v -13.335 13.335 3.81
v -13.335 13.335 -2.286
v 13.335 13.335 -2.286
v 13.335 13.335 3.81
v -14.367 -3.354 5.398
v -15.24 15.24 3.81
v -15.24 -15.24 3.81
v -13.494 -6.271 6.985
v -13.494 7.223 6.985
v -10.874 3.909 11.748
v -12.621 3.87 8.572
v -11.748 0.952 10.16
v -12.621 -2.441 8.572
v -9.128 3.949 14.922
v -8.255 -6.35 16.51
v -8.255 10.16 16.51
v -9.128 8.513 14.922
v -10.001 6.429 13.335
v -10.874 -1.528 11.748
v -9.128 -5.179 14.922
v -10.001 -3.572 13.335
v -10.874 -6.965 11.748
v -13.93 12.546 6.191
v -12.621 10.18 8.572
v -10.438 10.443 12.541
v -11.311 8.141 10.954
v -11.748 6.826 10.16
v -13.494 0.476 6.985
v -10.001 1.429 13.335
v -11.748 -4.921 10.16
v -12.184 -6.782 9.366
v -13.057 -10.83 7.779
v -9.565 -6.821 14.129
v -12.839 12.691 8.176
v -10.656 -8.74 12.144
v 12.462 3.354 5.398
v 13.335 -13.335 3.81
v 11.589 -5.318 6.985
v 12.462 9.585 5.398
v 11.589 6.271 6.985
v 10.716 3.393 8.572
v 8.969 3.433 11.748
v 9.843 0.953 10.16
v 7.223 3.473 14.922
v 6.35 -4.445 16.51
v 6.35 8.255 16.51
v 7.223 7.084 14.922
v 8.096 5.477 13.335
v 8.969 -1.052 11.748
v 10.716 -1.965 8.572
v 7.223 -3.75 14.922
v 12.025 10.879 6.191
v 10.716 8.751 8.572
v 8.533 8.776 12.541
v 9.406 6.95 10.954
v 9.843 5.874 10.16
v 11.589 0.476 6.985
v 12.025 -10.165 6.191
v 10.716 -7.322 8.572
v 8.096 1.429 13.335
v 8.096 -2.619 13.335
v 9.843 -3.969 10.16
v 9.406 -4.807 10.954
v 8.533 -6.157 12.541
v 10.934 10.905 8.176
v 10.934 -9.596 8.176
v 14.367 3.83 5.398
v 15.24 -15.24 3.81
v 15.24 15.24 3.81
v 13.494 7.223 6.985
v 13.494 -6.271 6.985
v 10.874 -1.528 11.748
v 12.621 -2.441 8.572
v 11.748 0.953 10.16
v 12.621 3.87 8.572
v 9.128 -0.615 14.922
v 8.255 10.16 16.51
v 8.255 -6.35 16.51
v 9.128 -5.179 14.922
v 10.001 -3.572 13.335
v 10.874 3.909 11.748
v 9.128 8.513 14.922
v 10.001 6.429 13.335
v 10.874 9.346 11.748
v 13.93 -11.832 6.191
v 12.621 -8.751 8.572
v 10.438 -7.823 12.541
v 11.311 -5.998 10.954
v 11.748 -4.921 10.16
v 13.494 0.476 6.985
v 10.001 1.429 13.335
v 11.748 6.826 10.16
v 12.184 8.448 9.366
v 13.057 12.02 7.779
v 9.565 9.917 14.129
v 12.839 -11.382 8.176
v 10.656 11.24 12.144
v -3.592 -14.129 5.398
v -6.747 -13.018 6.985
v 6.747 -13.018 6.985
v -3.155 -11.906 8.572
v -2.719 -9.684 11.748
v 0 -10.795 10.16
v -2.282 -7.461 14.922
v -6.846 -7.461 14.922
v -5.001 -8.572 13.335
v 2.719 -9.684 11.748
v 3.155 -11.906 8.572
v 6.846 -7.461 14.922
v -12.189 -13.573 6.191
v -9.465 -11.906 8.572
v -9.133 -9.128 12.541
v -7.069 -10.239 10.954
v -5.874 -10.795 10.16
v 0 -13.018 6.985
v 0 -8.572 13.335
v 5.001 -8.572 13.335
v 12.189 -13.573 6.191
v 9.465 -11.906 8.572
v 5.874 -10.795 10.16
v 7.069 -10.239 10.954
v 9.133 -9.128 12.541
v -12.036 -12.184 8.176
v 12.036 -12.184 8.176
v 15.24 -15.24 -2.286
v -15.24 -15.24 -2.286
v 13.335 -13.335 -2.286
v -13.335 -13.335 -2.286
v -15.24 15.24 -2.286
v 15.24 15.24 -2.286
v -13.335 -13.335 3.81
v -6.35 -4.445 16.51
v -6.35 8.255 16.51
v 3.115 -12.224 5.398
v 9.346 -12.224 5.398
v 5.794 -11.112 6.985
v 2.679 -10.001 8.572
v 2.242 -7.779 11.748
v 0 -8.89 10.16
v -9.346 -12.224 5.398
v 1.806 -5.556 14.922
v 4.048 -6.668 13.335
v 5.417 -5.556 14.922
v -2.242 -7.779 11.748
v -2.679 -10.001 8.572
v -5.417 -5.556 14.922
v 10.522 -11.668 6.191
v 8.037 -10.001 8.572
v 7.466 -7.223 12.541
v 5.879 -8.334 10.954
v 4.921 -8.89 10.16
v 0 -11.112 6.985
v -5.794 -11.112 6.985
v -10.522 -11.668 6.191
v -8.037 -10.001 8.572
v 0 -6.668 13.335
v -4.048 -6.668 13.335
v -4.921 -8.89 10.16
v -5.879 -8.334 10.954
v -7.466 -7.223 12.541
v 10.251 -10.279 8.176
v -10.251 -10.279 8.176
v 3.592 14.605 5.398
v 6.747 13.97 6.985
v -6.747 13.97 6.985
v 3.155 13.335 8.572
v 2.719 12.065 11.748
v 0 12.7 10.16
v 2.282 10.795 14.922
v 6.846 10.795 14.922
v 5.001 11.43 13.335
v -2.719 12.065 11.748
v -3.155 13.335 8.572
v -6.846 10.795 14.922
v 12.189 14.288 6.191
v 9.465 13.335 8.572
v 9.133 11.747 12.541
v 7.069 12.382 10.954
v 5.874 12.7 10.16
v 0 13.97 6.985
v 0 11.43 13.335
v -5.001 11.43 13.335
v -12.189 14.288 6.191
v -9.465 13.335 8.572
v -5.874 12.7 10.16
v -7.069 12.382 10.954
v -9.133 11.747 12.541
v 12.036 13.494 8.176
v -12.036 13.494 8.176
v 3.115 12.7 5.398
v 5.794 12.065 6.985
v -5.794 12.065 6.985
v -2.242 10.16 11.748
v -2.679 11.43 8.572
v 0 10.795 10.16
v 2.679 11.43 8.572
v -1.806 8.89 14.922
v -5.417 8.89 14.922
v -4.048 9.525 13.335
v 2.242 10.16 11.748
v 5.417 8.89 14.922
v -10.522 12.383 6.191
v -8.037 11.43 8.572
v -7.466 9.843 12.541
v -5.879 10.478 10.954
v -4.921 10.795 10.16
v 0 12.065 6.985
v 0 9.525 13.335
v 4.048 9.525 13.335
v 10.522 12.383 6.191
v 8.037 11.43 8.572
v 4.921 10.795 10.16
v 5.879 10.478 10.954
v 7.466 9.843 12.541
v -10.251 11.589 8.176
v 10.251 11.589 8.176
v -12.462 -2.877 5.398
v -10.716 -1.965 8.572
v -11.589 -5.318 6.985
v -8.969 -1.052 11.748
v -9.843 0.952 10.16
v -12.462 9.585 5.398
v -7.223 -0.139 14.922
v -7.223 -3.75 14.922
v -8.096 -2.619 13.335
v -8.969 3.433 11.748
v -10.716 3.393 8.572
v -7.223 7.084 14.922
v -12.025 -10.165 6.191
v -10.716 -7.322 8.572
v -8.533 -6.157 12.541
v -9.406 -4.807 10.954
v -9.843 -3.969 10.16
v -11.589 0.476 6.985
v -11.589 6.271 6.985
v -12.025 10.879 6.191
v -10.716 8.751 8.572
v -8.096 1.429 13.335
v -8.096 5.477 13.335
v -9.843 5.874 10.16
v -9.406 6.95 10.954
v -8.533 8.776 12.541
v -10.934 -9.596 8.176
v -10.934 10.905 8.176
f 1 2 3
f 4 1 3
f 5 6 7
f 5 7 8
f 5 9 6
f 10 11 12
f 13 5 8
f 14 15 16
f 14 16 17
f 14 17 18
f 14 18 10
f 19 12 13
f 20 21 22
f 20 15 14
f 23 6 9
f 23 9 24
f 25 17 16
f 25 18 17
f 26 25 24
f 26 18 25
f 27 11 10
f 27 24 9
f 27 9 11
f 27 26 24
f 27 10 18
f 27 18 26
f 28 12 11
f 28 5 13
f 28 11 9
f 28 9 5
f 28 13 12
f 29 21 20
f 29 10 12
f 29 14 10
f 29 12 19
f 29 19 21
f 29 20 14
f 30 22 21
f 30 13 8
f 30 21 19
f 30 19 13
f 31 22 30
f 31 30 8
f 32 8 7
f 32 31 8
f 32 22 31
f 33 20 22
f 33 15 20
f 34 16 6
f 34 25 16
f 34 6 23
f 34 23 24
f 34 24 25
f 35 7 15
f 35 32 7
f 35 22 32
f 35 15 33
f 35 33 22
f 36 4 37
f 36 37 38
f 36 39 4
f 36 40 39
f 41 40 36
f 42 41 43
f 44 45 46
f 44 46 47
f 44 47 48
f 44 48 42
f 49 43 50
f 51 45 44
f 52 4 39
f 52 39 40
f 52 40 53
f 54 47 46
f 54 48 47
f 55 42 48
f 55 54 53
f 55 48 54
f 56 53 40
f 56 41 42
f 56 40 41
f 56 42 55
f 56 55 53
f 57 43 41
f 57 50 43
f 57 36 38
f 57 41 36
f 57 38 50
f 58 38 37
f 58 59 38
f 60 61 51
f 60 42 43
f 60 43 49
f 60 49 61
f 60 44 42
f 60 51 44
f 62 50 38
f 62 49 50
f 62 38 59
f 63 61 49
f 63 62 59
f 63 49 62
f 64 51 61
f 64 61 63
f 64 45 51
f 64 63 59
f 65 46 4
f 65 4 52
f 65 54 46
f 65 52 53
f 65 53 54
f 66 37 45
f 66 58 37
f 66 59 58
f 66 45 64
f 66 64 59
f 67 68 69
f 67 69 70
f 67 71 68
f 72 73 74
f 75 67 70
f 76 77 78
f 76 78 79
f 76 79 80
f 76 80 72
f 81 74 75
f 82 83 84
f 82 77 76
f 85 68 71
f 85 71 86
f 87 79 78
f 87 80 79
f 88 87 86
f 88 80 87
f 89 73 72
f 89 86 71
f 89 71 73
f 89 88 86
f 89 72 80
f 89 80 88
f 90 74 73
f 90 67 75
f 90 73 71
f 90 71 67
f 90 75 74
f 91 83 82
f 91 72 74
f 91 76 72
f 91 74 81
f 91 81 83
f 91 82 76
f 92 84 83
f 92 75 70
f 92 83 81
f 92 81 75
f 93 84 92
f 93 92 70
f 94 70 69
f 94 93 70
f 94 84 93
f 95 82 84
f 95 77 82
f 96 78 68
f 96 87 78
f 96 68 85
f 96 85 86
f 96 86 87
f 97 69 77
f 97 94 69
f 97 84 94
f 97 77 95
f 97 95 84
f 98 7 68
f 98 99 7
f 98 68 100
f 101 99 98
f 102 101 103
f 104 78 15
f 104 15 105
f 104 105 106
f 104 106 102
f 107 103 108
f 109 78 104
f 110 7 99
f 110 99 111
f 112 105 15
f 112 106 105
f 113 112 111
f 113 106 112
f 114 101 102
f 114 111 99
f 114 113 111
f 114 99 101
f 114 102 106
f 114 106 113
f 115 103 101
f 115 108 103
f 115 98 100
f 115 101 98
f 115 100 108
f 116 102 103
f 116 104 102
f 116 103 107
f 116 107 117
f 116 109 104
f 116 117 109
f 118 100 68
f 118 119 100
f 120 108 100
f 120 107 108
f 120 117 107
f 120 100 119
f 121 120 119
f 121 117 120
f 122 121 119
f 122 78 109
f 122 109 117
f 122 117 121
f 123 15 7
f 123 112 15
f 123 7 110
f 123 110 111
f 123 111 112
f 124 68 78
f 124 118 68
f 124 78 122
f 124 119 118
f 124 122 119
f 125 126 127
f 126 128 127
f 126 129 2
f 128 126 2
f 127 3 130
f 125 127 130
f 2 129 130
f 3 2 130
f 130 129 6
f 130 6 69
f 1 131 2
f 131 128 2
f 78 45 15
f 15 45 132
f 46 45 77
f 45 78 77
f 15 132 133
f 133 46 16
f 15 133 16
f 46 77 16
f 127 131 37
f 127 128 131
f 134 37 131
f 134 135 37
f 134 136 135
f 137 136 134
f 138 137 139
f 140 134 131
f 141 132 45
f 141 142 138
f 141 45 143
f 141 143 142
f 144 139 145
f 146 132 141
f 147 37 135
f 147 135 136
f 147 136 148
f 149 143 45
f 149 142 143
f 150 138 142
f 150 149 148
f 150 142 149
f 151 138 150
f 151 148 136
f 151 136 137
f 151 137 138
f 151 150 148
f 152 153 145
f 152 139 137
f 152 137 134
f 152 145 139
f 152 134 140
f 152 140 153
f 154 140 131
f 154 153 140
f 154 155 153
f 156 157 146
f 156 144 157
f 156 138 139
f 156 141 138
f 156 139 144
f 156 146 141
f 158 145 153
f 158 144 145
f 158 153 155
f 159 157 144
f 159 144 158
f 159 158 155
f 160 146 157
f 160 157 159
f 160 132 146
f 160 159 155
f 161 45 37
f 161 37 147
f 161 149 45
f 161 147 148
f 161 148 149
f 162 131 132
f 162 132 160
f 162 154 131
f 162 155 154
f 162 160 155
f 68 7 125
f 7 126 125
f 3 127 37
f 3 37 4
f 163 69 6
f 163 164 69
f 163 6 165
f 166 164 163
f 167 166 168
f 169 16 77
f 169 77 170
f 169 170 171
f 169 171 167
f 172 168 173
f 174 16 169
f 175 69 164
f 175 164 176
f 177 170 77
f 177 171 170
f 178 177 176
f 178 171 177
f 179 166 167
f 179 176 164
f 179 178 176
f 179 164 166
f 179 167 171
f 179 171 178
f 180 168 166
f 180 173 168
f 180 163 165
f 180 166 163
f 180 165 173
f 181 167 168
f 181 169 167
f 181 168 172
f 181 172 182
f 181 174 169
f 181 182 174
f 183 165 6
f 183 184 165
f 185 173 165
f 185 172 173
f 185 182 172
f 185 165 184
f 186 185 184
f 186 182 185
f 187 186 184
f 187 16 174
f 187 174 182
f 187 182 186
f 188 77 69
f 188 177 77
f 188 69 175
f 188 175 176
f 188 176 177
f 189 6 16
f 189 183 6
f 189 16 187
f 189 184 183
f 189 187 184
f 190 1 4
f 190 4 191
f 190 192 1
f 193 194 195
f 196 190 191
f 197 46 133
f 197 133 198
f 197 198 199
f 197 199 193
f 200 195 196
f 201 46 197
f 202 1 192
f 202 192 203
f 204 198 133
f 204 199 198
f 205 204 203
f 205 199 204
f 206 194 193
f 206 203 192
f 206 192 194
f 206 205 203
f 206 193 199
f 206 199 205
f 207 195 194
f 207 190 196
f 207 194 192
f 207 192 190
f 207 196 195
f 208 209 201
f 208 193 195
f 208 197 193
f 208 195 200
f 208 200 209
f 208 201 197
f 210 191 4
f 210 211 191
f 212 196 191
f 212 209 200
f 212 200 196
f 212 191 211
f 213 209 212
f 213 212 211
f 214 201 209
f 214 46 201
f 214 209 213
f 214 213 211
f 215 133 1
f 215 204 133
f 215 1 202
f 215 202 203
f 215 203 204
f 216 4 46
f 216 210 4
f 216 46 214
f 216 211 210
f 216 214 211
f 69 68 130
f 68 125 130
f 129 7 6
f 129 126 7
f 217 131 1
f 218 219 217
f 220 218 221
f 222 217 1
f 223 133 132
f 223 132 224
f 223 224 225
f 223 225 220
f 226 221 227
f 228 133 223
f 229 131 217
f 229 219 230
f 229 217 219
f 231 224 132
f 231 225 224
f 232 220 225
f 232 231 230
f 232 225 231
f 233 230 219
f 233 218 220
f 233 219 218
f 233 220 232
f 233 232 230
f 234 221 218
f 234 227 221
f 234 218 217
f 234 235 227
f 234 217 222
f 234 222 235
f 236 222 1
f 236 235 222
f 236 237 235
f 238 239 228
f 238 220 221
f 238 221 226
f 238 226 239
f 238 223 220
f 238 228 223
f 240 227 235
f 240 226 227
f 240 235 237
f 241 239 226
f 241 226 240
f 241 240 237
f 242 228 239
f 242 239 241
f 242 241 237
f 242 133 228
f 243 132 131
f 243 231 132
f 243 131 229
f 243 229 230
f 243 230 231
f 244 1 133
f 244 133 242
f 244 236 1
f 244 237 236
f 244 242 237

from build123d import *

# Parameters (mm, degrees)
F0_W     = 30.48
F0_H     = 30.48
F0_W_2   = 26.67
F0_H_2   = 26.67
F1_DEPTH = 2.286
F2_DEPTH = 3.81


with BuildPart() as f1:
    # F0 (on Top) → F1 (new body)
    with BuildSketch(Plane.XY):
        Rectangle(F0_W, F0_H)
        Rectangle(F0_W_2, F0_H_2, mode=Mode.SUBTRACT)
    extrude(amount=-F1_DEPTH)

    # F0 (on Top) → F2 (join)
    with BuildSketch(Plane.XY):
        Rectangle(F0_W, F0_H)
        Rectangle(F0_W_2, F0_H_2, mode=Mode.SUBTRACT)
    extrude(amount=F2_DEPTH)

    # F5 (on face) → F6 section 0
    with BuildSketch(Plane.XY.offset(3.81)):
        Polygon((-13.335, 13.335), (-15.24, 15.24), (-15.24, -15.24), (-13.335, -13.335), align=None)
    # F4 (on offset) → F6 section 1
    with BuildSketch(Plane.XY.offset(16.51)):
        Polygon((-6.35, -4.445), (-6.35, 8.255), (-8.255, 10.16), (-8.255, -6.35), align=None)
    loft()

    # F5 (on face) → F7 section 0
    with BuildSketch(Plane.XY.offset(3.81)):
        Polygon((-15.24, -15.24), (15.24, -15.24), (13.335, -13.335), (-13.335, -13.335), align=None)
    # F4 (on offset) → F7 section 1
    with BuildSketch(Plane.XY.offset(16.51)):
        Polygon((8.255, -6.35), (6.35, -4.445), (-6.35, -4.445), (-8.255, -6.35), align=None)
    loft()

    # F5 (on face) → F8 section 0
    with BuildSketch(Plane.XY.offset(3.81)):
        Polygon((15.24, -15.24), (15.24, 15.24), (13.335, 13.335), (13.335, -13.335), align=None)
    # F4 (on offset) → F8 section 1
    with BuildSketch(Plane.XY.offset(16.51)):
        Polygon((8.255, 10.16), (6.35, 8.255), (6.35, -4.445), (8.255, -6.35), align=None)
    loft()

    # F5 (on face) → F9 section 0
    with BuildSketch(Plane.XY.offset(3.81)):
        Polygon((13.335, 13.335), (15.24, 15.24), (-15.24, 15.24), (-13.335, 13.335), align=None)
    # F4 (on offset) → F9 section 1
    with BuildSketch(Plane.XY.offset(16.51)):
        Polygon((-6.35, 8.255), (6.35, 8.255), (8.255, 10.16), (-8.255, 10.16), align=None)
    loft()


solid = f1.part
